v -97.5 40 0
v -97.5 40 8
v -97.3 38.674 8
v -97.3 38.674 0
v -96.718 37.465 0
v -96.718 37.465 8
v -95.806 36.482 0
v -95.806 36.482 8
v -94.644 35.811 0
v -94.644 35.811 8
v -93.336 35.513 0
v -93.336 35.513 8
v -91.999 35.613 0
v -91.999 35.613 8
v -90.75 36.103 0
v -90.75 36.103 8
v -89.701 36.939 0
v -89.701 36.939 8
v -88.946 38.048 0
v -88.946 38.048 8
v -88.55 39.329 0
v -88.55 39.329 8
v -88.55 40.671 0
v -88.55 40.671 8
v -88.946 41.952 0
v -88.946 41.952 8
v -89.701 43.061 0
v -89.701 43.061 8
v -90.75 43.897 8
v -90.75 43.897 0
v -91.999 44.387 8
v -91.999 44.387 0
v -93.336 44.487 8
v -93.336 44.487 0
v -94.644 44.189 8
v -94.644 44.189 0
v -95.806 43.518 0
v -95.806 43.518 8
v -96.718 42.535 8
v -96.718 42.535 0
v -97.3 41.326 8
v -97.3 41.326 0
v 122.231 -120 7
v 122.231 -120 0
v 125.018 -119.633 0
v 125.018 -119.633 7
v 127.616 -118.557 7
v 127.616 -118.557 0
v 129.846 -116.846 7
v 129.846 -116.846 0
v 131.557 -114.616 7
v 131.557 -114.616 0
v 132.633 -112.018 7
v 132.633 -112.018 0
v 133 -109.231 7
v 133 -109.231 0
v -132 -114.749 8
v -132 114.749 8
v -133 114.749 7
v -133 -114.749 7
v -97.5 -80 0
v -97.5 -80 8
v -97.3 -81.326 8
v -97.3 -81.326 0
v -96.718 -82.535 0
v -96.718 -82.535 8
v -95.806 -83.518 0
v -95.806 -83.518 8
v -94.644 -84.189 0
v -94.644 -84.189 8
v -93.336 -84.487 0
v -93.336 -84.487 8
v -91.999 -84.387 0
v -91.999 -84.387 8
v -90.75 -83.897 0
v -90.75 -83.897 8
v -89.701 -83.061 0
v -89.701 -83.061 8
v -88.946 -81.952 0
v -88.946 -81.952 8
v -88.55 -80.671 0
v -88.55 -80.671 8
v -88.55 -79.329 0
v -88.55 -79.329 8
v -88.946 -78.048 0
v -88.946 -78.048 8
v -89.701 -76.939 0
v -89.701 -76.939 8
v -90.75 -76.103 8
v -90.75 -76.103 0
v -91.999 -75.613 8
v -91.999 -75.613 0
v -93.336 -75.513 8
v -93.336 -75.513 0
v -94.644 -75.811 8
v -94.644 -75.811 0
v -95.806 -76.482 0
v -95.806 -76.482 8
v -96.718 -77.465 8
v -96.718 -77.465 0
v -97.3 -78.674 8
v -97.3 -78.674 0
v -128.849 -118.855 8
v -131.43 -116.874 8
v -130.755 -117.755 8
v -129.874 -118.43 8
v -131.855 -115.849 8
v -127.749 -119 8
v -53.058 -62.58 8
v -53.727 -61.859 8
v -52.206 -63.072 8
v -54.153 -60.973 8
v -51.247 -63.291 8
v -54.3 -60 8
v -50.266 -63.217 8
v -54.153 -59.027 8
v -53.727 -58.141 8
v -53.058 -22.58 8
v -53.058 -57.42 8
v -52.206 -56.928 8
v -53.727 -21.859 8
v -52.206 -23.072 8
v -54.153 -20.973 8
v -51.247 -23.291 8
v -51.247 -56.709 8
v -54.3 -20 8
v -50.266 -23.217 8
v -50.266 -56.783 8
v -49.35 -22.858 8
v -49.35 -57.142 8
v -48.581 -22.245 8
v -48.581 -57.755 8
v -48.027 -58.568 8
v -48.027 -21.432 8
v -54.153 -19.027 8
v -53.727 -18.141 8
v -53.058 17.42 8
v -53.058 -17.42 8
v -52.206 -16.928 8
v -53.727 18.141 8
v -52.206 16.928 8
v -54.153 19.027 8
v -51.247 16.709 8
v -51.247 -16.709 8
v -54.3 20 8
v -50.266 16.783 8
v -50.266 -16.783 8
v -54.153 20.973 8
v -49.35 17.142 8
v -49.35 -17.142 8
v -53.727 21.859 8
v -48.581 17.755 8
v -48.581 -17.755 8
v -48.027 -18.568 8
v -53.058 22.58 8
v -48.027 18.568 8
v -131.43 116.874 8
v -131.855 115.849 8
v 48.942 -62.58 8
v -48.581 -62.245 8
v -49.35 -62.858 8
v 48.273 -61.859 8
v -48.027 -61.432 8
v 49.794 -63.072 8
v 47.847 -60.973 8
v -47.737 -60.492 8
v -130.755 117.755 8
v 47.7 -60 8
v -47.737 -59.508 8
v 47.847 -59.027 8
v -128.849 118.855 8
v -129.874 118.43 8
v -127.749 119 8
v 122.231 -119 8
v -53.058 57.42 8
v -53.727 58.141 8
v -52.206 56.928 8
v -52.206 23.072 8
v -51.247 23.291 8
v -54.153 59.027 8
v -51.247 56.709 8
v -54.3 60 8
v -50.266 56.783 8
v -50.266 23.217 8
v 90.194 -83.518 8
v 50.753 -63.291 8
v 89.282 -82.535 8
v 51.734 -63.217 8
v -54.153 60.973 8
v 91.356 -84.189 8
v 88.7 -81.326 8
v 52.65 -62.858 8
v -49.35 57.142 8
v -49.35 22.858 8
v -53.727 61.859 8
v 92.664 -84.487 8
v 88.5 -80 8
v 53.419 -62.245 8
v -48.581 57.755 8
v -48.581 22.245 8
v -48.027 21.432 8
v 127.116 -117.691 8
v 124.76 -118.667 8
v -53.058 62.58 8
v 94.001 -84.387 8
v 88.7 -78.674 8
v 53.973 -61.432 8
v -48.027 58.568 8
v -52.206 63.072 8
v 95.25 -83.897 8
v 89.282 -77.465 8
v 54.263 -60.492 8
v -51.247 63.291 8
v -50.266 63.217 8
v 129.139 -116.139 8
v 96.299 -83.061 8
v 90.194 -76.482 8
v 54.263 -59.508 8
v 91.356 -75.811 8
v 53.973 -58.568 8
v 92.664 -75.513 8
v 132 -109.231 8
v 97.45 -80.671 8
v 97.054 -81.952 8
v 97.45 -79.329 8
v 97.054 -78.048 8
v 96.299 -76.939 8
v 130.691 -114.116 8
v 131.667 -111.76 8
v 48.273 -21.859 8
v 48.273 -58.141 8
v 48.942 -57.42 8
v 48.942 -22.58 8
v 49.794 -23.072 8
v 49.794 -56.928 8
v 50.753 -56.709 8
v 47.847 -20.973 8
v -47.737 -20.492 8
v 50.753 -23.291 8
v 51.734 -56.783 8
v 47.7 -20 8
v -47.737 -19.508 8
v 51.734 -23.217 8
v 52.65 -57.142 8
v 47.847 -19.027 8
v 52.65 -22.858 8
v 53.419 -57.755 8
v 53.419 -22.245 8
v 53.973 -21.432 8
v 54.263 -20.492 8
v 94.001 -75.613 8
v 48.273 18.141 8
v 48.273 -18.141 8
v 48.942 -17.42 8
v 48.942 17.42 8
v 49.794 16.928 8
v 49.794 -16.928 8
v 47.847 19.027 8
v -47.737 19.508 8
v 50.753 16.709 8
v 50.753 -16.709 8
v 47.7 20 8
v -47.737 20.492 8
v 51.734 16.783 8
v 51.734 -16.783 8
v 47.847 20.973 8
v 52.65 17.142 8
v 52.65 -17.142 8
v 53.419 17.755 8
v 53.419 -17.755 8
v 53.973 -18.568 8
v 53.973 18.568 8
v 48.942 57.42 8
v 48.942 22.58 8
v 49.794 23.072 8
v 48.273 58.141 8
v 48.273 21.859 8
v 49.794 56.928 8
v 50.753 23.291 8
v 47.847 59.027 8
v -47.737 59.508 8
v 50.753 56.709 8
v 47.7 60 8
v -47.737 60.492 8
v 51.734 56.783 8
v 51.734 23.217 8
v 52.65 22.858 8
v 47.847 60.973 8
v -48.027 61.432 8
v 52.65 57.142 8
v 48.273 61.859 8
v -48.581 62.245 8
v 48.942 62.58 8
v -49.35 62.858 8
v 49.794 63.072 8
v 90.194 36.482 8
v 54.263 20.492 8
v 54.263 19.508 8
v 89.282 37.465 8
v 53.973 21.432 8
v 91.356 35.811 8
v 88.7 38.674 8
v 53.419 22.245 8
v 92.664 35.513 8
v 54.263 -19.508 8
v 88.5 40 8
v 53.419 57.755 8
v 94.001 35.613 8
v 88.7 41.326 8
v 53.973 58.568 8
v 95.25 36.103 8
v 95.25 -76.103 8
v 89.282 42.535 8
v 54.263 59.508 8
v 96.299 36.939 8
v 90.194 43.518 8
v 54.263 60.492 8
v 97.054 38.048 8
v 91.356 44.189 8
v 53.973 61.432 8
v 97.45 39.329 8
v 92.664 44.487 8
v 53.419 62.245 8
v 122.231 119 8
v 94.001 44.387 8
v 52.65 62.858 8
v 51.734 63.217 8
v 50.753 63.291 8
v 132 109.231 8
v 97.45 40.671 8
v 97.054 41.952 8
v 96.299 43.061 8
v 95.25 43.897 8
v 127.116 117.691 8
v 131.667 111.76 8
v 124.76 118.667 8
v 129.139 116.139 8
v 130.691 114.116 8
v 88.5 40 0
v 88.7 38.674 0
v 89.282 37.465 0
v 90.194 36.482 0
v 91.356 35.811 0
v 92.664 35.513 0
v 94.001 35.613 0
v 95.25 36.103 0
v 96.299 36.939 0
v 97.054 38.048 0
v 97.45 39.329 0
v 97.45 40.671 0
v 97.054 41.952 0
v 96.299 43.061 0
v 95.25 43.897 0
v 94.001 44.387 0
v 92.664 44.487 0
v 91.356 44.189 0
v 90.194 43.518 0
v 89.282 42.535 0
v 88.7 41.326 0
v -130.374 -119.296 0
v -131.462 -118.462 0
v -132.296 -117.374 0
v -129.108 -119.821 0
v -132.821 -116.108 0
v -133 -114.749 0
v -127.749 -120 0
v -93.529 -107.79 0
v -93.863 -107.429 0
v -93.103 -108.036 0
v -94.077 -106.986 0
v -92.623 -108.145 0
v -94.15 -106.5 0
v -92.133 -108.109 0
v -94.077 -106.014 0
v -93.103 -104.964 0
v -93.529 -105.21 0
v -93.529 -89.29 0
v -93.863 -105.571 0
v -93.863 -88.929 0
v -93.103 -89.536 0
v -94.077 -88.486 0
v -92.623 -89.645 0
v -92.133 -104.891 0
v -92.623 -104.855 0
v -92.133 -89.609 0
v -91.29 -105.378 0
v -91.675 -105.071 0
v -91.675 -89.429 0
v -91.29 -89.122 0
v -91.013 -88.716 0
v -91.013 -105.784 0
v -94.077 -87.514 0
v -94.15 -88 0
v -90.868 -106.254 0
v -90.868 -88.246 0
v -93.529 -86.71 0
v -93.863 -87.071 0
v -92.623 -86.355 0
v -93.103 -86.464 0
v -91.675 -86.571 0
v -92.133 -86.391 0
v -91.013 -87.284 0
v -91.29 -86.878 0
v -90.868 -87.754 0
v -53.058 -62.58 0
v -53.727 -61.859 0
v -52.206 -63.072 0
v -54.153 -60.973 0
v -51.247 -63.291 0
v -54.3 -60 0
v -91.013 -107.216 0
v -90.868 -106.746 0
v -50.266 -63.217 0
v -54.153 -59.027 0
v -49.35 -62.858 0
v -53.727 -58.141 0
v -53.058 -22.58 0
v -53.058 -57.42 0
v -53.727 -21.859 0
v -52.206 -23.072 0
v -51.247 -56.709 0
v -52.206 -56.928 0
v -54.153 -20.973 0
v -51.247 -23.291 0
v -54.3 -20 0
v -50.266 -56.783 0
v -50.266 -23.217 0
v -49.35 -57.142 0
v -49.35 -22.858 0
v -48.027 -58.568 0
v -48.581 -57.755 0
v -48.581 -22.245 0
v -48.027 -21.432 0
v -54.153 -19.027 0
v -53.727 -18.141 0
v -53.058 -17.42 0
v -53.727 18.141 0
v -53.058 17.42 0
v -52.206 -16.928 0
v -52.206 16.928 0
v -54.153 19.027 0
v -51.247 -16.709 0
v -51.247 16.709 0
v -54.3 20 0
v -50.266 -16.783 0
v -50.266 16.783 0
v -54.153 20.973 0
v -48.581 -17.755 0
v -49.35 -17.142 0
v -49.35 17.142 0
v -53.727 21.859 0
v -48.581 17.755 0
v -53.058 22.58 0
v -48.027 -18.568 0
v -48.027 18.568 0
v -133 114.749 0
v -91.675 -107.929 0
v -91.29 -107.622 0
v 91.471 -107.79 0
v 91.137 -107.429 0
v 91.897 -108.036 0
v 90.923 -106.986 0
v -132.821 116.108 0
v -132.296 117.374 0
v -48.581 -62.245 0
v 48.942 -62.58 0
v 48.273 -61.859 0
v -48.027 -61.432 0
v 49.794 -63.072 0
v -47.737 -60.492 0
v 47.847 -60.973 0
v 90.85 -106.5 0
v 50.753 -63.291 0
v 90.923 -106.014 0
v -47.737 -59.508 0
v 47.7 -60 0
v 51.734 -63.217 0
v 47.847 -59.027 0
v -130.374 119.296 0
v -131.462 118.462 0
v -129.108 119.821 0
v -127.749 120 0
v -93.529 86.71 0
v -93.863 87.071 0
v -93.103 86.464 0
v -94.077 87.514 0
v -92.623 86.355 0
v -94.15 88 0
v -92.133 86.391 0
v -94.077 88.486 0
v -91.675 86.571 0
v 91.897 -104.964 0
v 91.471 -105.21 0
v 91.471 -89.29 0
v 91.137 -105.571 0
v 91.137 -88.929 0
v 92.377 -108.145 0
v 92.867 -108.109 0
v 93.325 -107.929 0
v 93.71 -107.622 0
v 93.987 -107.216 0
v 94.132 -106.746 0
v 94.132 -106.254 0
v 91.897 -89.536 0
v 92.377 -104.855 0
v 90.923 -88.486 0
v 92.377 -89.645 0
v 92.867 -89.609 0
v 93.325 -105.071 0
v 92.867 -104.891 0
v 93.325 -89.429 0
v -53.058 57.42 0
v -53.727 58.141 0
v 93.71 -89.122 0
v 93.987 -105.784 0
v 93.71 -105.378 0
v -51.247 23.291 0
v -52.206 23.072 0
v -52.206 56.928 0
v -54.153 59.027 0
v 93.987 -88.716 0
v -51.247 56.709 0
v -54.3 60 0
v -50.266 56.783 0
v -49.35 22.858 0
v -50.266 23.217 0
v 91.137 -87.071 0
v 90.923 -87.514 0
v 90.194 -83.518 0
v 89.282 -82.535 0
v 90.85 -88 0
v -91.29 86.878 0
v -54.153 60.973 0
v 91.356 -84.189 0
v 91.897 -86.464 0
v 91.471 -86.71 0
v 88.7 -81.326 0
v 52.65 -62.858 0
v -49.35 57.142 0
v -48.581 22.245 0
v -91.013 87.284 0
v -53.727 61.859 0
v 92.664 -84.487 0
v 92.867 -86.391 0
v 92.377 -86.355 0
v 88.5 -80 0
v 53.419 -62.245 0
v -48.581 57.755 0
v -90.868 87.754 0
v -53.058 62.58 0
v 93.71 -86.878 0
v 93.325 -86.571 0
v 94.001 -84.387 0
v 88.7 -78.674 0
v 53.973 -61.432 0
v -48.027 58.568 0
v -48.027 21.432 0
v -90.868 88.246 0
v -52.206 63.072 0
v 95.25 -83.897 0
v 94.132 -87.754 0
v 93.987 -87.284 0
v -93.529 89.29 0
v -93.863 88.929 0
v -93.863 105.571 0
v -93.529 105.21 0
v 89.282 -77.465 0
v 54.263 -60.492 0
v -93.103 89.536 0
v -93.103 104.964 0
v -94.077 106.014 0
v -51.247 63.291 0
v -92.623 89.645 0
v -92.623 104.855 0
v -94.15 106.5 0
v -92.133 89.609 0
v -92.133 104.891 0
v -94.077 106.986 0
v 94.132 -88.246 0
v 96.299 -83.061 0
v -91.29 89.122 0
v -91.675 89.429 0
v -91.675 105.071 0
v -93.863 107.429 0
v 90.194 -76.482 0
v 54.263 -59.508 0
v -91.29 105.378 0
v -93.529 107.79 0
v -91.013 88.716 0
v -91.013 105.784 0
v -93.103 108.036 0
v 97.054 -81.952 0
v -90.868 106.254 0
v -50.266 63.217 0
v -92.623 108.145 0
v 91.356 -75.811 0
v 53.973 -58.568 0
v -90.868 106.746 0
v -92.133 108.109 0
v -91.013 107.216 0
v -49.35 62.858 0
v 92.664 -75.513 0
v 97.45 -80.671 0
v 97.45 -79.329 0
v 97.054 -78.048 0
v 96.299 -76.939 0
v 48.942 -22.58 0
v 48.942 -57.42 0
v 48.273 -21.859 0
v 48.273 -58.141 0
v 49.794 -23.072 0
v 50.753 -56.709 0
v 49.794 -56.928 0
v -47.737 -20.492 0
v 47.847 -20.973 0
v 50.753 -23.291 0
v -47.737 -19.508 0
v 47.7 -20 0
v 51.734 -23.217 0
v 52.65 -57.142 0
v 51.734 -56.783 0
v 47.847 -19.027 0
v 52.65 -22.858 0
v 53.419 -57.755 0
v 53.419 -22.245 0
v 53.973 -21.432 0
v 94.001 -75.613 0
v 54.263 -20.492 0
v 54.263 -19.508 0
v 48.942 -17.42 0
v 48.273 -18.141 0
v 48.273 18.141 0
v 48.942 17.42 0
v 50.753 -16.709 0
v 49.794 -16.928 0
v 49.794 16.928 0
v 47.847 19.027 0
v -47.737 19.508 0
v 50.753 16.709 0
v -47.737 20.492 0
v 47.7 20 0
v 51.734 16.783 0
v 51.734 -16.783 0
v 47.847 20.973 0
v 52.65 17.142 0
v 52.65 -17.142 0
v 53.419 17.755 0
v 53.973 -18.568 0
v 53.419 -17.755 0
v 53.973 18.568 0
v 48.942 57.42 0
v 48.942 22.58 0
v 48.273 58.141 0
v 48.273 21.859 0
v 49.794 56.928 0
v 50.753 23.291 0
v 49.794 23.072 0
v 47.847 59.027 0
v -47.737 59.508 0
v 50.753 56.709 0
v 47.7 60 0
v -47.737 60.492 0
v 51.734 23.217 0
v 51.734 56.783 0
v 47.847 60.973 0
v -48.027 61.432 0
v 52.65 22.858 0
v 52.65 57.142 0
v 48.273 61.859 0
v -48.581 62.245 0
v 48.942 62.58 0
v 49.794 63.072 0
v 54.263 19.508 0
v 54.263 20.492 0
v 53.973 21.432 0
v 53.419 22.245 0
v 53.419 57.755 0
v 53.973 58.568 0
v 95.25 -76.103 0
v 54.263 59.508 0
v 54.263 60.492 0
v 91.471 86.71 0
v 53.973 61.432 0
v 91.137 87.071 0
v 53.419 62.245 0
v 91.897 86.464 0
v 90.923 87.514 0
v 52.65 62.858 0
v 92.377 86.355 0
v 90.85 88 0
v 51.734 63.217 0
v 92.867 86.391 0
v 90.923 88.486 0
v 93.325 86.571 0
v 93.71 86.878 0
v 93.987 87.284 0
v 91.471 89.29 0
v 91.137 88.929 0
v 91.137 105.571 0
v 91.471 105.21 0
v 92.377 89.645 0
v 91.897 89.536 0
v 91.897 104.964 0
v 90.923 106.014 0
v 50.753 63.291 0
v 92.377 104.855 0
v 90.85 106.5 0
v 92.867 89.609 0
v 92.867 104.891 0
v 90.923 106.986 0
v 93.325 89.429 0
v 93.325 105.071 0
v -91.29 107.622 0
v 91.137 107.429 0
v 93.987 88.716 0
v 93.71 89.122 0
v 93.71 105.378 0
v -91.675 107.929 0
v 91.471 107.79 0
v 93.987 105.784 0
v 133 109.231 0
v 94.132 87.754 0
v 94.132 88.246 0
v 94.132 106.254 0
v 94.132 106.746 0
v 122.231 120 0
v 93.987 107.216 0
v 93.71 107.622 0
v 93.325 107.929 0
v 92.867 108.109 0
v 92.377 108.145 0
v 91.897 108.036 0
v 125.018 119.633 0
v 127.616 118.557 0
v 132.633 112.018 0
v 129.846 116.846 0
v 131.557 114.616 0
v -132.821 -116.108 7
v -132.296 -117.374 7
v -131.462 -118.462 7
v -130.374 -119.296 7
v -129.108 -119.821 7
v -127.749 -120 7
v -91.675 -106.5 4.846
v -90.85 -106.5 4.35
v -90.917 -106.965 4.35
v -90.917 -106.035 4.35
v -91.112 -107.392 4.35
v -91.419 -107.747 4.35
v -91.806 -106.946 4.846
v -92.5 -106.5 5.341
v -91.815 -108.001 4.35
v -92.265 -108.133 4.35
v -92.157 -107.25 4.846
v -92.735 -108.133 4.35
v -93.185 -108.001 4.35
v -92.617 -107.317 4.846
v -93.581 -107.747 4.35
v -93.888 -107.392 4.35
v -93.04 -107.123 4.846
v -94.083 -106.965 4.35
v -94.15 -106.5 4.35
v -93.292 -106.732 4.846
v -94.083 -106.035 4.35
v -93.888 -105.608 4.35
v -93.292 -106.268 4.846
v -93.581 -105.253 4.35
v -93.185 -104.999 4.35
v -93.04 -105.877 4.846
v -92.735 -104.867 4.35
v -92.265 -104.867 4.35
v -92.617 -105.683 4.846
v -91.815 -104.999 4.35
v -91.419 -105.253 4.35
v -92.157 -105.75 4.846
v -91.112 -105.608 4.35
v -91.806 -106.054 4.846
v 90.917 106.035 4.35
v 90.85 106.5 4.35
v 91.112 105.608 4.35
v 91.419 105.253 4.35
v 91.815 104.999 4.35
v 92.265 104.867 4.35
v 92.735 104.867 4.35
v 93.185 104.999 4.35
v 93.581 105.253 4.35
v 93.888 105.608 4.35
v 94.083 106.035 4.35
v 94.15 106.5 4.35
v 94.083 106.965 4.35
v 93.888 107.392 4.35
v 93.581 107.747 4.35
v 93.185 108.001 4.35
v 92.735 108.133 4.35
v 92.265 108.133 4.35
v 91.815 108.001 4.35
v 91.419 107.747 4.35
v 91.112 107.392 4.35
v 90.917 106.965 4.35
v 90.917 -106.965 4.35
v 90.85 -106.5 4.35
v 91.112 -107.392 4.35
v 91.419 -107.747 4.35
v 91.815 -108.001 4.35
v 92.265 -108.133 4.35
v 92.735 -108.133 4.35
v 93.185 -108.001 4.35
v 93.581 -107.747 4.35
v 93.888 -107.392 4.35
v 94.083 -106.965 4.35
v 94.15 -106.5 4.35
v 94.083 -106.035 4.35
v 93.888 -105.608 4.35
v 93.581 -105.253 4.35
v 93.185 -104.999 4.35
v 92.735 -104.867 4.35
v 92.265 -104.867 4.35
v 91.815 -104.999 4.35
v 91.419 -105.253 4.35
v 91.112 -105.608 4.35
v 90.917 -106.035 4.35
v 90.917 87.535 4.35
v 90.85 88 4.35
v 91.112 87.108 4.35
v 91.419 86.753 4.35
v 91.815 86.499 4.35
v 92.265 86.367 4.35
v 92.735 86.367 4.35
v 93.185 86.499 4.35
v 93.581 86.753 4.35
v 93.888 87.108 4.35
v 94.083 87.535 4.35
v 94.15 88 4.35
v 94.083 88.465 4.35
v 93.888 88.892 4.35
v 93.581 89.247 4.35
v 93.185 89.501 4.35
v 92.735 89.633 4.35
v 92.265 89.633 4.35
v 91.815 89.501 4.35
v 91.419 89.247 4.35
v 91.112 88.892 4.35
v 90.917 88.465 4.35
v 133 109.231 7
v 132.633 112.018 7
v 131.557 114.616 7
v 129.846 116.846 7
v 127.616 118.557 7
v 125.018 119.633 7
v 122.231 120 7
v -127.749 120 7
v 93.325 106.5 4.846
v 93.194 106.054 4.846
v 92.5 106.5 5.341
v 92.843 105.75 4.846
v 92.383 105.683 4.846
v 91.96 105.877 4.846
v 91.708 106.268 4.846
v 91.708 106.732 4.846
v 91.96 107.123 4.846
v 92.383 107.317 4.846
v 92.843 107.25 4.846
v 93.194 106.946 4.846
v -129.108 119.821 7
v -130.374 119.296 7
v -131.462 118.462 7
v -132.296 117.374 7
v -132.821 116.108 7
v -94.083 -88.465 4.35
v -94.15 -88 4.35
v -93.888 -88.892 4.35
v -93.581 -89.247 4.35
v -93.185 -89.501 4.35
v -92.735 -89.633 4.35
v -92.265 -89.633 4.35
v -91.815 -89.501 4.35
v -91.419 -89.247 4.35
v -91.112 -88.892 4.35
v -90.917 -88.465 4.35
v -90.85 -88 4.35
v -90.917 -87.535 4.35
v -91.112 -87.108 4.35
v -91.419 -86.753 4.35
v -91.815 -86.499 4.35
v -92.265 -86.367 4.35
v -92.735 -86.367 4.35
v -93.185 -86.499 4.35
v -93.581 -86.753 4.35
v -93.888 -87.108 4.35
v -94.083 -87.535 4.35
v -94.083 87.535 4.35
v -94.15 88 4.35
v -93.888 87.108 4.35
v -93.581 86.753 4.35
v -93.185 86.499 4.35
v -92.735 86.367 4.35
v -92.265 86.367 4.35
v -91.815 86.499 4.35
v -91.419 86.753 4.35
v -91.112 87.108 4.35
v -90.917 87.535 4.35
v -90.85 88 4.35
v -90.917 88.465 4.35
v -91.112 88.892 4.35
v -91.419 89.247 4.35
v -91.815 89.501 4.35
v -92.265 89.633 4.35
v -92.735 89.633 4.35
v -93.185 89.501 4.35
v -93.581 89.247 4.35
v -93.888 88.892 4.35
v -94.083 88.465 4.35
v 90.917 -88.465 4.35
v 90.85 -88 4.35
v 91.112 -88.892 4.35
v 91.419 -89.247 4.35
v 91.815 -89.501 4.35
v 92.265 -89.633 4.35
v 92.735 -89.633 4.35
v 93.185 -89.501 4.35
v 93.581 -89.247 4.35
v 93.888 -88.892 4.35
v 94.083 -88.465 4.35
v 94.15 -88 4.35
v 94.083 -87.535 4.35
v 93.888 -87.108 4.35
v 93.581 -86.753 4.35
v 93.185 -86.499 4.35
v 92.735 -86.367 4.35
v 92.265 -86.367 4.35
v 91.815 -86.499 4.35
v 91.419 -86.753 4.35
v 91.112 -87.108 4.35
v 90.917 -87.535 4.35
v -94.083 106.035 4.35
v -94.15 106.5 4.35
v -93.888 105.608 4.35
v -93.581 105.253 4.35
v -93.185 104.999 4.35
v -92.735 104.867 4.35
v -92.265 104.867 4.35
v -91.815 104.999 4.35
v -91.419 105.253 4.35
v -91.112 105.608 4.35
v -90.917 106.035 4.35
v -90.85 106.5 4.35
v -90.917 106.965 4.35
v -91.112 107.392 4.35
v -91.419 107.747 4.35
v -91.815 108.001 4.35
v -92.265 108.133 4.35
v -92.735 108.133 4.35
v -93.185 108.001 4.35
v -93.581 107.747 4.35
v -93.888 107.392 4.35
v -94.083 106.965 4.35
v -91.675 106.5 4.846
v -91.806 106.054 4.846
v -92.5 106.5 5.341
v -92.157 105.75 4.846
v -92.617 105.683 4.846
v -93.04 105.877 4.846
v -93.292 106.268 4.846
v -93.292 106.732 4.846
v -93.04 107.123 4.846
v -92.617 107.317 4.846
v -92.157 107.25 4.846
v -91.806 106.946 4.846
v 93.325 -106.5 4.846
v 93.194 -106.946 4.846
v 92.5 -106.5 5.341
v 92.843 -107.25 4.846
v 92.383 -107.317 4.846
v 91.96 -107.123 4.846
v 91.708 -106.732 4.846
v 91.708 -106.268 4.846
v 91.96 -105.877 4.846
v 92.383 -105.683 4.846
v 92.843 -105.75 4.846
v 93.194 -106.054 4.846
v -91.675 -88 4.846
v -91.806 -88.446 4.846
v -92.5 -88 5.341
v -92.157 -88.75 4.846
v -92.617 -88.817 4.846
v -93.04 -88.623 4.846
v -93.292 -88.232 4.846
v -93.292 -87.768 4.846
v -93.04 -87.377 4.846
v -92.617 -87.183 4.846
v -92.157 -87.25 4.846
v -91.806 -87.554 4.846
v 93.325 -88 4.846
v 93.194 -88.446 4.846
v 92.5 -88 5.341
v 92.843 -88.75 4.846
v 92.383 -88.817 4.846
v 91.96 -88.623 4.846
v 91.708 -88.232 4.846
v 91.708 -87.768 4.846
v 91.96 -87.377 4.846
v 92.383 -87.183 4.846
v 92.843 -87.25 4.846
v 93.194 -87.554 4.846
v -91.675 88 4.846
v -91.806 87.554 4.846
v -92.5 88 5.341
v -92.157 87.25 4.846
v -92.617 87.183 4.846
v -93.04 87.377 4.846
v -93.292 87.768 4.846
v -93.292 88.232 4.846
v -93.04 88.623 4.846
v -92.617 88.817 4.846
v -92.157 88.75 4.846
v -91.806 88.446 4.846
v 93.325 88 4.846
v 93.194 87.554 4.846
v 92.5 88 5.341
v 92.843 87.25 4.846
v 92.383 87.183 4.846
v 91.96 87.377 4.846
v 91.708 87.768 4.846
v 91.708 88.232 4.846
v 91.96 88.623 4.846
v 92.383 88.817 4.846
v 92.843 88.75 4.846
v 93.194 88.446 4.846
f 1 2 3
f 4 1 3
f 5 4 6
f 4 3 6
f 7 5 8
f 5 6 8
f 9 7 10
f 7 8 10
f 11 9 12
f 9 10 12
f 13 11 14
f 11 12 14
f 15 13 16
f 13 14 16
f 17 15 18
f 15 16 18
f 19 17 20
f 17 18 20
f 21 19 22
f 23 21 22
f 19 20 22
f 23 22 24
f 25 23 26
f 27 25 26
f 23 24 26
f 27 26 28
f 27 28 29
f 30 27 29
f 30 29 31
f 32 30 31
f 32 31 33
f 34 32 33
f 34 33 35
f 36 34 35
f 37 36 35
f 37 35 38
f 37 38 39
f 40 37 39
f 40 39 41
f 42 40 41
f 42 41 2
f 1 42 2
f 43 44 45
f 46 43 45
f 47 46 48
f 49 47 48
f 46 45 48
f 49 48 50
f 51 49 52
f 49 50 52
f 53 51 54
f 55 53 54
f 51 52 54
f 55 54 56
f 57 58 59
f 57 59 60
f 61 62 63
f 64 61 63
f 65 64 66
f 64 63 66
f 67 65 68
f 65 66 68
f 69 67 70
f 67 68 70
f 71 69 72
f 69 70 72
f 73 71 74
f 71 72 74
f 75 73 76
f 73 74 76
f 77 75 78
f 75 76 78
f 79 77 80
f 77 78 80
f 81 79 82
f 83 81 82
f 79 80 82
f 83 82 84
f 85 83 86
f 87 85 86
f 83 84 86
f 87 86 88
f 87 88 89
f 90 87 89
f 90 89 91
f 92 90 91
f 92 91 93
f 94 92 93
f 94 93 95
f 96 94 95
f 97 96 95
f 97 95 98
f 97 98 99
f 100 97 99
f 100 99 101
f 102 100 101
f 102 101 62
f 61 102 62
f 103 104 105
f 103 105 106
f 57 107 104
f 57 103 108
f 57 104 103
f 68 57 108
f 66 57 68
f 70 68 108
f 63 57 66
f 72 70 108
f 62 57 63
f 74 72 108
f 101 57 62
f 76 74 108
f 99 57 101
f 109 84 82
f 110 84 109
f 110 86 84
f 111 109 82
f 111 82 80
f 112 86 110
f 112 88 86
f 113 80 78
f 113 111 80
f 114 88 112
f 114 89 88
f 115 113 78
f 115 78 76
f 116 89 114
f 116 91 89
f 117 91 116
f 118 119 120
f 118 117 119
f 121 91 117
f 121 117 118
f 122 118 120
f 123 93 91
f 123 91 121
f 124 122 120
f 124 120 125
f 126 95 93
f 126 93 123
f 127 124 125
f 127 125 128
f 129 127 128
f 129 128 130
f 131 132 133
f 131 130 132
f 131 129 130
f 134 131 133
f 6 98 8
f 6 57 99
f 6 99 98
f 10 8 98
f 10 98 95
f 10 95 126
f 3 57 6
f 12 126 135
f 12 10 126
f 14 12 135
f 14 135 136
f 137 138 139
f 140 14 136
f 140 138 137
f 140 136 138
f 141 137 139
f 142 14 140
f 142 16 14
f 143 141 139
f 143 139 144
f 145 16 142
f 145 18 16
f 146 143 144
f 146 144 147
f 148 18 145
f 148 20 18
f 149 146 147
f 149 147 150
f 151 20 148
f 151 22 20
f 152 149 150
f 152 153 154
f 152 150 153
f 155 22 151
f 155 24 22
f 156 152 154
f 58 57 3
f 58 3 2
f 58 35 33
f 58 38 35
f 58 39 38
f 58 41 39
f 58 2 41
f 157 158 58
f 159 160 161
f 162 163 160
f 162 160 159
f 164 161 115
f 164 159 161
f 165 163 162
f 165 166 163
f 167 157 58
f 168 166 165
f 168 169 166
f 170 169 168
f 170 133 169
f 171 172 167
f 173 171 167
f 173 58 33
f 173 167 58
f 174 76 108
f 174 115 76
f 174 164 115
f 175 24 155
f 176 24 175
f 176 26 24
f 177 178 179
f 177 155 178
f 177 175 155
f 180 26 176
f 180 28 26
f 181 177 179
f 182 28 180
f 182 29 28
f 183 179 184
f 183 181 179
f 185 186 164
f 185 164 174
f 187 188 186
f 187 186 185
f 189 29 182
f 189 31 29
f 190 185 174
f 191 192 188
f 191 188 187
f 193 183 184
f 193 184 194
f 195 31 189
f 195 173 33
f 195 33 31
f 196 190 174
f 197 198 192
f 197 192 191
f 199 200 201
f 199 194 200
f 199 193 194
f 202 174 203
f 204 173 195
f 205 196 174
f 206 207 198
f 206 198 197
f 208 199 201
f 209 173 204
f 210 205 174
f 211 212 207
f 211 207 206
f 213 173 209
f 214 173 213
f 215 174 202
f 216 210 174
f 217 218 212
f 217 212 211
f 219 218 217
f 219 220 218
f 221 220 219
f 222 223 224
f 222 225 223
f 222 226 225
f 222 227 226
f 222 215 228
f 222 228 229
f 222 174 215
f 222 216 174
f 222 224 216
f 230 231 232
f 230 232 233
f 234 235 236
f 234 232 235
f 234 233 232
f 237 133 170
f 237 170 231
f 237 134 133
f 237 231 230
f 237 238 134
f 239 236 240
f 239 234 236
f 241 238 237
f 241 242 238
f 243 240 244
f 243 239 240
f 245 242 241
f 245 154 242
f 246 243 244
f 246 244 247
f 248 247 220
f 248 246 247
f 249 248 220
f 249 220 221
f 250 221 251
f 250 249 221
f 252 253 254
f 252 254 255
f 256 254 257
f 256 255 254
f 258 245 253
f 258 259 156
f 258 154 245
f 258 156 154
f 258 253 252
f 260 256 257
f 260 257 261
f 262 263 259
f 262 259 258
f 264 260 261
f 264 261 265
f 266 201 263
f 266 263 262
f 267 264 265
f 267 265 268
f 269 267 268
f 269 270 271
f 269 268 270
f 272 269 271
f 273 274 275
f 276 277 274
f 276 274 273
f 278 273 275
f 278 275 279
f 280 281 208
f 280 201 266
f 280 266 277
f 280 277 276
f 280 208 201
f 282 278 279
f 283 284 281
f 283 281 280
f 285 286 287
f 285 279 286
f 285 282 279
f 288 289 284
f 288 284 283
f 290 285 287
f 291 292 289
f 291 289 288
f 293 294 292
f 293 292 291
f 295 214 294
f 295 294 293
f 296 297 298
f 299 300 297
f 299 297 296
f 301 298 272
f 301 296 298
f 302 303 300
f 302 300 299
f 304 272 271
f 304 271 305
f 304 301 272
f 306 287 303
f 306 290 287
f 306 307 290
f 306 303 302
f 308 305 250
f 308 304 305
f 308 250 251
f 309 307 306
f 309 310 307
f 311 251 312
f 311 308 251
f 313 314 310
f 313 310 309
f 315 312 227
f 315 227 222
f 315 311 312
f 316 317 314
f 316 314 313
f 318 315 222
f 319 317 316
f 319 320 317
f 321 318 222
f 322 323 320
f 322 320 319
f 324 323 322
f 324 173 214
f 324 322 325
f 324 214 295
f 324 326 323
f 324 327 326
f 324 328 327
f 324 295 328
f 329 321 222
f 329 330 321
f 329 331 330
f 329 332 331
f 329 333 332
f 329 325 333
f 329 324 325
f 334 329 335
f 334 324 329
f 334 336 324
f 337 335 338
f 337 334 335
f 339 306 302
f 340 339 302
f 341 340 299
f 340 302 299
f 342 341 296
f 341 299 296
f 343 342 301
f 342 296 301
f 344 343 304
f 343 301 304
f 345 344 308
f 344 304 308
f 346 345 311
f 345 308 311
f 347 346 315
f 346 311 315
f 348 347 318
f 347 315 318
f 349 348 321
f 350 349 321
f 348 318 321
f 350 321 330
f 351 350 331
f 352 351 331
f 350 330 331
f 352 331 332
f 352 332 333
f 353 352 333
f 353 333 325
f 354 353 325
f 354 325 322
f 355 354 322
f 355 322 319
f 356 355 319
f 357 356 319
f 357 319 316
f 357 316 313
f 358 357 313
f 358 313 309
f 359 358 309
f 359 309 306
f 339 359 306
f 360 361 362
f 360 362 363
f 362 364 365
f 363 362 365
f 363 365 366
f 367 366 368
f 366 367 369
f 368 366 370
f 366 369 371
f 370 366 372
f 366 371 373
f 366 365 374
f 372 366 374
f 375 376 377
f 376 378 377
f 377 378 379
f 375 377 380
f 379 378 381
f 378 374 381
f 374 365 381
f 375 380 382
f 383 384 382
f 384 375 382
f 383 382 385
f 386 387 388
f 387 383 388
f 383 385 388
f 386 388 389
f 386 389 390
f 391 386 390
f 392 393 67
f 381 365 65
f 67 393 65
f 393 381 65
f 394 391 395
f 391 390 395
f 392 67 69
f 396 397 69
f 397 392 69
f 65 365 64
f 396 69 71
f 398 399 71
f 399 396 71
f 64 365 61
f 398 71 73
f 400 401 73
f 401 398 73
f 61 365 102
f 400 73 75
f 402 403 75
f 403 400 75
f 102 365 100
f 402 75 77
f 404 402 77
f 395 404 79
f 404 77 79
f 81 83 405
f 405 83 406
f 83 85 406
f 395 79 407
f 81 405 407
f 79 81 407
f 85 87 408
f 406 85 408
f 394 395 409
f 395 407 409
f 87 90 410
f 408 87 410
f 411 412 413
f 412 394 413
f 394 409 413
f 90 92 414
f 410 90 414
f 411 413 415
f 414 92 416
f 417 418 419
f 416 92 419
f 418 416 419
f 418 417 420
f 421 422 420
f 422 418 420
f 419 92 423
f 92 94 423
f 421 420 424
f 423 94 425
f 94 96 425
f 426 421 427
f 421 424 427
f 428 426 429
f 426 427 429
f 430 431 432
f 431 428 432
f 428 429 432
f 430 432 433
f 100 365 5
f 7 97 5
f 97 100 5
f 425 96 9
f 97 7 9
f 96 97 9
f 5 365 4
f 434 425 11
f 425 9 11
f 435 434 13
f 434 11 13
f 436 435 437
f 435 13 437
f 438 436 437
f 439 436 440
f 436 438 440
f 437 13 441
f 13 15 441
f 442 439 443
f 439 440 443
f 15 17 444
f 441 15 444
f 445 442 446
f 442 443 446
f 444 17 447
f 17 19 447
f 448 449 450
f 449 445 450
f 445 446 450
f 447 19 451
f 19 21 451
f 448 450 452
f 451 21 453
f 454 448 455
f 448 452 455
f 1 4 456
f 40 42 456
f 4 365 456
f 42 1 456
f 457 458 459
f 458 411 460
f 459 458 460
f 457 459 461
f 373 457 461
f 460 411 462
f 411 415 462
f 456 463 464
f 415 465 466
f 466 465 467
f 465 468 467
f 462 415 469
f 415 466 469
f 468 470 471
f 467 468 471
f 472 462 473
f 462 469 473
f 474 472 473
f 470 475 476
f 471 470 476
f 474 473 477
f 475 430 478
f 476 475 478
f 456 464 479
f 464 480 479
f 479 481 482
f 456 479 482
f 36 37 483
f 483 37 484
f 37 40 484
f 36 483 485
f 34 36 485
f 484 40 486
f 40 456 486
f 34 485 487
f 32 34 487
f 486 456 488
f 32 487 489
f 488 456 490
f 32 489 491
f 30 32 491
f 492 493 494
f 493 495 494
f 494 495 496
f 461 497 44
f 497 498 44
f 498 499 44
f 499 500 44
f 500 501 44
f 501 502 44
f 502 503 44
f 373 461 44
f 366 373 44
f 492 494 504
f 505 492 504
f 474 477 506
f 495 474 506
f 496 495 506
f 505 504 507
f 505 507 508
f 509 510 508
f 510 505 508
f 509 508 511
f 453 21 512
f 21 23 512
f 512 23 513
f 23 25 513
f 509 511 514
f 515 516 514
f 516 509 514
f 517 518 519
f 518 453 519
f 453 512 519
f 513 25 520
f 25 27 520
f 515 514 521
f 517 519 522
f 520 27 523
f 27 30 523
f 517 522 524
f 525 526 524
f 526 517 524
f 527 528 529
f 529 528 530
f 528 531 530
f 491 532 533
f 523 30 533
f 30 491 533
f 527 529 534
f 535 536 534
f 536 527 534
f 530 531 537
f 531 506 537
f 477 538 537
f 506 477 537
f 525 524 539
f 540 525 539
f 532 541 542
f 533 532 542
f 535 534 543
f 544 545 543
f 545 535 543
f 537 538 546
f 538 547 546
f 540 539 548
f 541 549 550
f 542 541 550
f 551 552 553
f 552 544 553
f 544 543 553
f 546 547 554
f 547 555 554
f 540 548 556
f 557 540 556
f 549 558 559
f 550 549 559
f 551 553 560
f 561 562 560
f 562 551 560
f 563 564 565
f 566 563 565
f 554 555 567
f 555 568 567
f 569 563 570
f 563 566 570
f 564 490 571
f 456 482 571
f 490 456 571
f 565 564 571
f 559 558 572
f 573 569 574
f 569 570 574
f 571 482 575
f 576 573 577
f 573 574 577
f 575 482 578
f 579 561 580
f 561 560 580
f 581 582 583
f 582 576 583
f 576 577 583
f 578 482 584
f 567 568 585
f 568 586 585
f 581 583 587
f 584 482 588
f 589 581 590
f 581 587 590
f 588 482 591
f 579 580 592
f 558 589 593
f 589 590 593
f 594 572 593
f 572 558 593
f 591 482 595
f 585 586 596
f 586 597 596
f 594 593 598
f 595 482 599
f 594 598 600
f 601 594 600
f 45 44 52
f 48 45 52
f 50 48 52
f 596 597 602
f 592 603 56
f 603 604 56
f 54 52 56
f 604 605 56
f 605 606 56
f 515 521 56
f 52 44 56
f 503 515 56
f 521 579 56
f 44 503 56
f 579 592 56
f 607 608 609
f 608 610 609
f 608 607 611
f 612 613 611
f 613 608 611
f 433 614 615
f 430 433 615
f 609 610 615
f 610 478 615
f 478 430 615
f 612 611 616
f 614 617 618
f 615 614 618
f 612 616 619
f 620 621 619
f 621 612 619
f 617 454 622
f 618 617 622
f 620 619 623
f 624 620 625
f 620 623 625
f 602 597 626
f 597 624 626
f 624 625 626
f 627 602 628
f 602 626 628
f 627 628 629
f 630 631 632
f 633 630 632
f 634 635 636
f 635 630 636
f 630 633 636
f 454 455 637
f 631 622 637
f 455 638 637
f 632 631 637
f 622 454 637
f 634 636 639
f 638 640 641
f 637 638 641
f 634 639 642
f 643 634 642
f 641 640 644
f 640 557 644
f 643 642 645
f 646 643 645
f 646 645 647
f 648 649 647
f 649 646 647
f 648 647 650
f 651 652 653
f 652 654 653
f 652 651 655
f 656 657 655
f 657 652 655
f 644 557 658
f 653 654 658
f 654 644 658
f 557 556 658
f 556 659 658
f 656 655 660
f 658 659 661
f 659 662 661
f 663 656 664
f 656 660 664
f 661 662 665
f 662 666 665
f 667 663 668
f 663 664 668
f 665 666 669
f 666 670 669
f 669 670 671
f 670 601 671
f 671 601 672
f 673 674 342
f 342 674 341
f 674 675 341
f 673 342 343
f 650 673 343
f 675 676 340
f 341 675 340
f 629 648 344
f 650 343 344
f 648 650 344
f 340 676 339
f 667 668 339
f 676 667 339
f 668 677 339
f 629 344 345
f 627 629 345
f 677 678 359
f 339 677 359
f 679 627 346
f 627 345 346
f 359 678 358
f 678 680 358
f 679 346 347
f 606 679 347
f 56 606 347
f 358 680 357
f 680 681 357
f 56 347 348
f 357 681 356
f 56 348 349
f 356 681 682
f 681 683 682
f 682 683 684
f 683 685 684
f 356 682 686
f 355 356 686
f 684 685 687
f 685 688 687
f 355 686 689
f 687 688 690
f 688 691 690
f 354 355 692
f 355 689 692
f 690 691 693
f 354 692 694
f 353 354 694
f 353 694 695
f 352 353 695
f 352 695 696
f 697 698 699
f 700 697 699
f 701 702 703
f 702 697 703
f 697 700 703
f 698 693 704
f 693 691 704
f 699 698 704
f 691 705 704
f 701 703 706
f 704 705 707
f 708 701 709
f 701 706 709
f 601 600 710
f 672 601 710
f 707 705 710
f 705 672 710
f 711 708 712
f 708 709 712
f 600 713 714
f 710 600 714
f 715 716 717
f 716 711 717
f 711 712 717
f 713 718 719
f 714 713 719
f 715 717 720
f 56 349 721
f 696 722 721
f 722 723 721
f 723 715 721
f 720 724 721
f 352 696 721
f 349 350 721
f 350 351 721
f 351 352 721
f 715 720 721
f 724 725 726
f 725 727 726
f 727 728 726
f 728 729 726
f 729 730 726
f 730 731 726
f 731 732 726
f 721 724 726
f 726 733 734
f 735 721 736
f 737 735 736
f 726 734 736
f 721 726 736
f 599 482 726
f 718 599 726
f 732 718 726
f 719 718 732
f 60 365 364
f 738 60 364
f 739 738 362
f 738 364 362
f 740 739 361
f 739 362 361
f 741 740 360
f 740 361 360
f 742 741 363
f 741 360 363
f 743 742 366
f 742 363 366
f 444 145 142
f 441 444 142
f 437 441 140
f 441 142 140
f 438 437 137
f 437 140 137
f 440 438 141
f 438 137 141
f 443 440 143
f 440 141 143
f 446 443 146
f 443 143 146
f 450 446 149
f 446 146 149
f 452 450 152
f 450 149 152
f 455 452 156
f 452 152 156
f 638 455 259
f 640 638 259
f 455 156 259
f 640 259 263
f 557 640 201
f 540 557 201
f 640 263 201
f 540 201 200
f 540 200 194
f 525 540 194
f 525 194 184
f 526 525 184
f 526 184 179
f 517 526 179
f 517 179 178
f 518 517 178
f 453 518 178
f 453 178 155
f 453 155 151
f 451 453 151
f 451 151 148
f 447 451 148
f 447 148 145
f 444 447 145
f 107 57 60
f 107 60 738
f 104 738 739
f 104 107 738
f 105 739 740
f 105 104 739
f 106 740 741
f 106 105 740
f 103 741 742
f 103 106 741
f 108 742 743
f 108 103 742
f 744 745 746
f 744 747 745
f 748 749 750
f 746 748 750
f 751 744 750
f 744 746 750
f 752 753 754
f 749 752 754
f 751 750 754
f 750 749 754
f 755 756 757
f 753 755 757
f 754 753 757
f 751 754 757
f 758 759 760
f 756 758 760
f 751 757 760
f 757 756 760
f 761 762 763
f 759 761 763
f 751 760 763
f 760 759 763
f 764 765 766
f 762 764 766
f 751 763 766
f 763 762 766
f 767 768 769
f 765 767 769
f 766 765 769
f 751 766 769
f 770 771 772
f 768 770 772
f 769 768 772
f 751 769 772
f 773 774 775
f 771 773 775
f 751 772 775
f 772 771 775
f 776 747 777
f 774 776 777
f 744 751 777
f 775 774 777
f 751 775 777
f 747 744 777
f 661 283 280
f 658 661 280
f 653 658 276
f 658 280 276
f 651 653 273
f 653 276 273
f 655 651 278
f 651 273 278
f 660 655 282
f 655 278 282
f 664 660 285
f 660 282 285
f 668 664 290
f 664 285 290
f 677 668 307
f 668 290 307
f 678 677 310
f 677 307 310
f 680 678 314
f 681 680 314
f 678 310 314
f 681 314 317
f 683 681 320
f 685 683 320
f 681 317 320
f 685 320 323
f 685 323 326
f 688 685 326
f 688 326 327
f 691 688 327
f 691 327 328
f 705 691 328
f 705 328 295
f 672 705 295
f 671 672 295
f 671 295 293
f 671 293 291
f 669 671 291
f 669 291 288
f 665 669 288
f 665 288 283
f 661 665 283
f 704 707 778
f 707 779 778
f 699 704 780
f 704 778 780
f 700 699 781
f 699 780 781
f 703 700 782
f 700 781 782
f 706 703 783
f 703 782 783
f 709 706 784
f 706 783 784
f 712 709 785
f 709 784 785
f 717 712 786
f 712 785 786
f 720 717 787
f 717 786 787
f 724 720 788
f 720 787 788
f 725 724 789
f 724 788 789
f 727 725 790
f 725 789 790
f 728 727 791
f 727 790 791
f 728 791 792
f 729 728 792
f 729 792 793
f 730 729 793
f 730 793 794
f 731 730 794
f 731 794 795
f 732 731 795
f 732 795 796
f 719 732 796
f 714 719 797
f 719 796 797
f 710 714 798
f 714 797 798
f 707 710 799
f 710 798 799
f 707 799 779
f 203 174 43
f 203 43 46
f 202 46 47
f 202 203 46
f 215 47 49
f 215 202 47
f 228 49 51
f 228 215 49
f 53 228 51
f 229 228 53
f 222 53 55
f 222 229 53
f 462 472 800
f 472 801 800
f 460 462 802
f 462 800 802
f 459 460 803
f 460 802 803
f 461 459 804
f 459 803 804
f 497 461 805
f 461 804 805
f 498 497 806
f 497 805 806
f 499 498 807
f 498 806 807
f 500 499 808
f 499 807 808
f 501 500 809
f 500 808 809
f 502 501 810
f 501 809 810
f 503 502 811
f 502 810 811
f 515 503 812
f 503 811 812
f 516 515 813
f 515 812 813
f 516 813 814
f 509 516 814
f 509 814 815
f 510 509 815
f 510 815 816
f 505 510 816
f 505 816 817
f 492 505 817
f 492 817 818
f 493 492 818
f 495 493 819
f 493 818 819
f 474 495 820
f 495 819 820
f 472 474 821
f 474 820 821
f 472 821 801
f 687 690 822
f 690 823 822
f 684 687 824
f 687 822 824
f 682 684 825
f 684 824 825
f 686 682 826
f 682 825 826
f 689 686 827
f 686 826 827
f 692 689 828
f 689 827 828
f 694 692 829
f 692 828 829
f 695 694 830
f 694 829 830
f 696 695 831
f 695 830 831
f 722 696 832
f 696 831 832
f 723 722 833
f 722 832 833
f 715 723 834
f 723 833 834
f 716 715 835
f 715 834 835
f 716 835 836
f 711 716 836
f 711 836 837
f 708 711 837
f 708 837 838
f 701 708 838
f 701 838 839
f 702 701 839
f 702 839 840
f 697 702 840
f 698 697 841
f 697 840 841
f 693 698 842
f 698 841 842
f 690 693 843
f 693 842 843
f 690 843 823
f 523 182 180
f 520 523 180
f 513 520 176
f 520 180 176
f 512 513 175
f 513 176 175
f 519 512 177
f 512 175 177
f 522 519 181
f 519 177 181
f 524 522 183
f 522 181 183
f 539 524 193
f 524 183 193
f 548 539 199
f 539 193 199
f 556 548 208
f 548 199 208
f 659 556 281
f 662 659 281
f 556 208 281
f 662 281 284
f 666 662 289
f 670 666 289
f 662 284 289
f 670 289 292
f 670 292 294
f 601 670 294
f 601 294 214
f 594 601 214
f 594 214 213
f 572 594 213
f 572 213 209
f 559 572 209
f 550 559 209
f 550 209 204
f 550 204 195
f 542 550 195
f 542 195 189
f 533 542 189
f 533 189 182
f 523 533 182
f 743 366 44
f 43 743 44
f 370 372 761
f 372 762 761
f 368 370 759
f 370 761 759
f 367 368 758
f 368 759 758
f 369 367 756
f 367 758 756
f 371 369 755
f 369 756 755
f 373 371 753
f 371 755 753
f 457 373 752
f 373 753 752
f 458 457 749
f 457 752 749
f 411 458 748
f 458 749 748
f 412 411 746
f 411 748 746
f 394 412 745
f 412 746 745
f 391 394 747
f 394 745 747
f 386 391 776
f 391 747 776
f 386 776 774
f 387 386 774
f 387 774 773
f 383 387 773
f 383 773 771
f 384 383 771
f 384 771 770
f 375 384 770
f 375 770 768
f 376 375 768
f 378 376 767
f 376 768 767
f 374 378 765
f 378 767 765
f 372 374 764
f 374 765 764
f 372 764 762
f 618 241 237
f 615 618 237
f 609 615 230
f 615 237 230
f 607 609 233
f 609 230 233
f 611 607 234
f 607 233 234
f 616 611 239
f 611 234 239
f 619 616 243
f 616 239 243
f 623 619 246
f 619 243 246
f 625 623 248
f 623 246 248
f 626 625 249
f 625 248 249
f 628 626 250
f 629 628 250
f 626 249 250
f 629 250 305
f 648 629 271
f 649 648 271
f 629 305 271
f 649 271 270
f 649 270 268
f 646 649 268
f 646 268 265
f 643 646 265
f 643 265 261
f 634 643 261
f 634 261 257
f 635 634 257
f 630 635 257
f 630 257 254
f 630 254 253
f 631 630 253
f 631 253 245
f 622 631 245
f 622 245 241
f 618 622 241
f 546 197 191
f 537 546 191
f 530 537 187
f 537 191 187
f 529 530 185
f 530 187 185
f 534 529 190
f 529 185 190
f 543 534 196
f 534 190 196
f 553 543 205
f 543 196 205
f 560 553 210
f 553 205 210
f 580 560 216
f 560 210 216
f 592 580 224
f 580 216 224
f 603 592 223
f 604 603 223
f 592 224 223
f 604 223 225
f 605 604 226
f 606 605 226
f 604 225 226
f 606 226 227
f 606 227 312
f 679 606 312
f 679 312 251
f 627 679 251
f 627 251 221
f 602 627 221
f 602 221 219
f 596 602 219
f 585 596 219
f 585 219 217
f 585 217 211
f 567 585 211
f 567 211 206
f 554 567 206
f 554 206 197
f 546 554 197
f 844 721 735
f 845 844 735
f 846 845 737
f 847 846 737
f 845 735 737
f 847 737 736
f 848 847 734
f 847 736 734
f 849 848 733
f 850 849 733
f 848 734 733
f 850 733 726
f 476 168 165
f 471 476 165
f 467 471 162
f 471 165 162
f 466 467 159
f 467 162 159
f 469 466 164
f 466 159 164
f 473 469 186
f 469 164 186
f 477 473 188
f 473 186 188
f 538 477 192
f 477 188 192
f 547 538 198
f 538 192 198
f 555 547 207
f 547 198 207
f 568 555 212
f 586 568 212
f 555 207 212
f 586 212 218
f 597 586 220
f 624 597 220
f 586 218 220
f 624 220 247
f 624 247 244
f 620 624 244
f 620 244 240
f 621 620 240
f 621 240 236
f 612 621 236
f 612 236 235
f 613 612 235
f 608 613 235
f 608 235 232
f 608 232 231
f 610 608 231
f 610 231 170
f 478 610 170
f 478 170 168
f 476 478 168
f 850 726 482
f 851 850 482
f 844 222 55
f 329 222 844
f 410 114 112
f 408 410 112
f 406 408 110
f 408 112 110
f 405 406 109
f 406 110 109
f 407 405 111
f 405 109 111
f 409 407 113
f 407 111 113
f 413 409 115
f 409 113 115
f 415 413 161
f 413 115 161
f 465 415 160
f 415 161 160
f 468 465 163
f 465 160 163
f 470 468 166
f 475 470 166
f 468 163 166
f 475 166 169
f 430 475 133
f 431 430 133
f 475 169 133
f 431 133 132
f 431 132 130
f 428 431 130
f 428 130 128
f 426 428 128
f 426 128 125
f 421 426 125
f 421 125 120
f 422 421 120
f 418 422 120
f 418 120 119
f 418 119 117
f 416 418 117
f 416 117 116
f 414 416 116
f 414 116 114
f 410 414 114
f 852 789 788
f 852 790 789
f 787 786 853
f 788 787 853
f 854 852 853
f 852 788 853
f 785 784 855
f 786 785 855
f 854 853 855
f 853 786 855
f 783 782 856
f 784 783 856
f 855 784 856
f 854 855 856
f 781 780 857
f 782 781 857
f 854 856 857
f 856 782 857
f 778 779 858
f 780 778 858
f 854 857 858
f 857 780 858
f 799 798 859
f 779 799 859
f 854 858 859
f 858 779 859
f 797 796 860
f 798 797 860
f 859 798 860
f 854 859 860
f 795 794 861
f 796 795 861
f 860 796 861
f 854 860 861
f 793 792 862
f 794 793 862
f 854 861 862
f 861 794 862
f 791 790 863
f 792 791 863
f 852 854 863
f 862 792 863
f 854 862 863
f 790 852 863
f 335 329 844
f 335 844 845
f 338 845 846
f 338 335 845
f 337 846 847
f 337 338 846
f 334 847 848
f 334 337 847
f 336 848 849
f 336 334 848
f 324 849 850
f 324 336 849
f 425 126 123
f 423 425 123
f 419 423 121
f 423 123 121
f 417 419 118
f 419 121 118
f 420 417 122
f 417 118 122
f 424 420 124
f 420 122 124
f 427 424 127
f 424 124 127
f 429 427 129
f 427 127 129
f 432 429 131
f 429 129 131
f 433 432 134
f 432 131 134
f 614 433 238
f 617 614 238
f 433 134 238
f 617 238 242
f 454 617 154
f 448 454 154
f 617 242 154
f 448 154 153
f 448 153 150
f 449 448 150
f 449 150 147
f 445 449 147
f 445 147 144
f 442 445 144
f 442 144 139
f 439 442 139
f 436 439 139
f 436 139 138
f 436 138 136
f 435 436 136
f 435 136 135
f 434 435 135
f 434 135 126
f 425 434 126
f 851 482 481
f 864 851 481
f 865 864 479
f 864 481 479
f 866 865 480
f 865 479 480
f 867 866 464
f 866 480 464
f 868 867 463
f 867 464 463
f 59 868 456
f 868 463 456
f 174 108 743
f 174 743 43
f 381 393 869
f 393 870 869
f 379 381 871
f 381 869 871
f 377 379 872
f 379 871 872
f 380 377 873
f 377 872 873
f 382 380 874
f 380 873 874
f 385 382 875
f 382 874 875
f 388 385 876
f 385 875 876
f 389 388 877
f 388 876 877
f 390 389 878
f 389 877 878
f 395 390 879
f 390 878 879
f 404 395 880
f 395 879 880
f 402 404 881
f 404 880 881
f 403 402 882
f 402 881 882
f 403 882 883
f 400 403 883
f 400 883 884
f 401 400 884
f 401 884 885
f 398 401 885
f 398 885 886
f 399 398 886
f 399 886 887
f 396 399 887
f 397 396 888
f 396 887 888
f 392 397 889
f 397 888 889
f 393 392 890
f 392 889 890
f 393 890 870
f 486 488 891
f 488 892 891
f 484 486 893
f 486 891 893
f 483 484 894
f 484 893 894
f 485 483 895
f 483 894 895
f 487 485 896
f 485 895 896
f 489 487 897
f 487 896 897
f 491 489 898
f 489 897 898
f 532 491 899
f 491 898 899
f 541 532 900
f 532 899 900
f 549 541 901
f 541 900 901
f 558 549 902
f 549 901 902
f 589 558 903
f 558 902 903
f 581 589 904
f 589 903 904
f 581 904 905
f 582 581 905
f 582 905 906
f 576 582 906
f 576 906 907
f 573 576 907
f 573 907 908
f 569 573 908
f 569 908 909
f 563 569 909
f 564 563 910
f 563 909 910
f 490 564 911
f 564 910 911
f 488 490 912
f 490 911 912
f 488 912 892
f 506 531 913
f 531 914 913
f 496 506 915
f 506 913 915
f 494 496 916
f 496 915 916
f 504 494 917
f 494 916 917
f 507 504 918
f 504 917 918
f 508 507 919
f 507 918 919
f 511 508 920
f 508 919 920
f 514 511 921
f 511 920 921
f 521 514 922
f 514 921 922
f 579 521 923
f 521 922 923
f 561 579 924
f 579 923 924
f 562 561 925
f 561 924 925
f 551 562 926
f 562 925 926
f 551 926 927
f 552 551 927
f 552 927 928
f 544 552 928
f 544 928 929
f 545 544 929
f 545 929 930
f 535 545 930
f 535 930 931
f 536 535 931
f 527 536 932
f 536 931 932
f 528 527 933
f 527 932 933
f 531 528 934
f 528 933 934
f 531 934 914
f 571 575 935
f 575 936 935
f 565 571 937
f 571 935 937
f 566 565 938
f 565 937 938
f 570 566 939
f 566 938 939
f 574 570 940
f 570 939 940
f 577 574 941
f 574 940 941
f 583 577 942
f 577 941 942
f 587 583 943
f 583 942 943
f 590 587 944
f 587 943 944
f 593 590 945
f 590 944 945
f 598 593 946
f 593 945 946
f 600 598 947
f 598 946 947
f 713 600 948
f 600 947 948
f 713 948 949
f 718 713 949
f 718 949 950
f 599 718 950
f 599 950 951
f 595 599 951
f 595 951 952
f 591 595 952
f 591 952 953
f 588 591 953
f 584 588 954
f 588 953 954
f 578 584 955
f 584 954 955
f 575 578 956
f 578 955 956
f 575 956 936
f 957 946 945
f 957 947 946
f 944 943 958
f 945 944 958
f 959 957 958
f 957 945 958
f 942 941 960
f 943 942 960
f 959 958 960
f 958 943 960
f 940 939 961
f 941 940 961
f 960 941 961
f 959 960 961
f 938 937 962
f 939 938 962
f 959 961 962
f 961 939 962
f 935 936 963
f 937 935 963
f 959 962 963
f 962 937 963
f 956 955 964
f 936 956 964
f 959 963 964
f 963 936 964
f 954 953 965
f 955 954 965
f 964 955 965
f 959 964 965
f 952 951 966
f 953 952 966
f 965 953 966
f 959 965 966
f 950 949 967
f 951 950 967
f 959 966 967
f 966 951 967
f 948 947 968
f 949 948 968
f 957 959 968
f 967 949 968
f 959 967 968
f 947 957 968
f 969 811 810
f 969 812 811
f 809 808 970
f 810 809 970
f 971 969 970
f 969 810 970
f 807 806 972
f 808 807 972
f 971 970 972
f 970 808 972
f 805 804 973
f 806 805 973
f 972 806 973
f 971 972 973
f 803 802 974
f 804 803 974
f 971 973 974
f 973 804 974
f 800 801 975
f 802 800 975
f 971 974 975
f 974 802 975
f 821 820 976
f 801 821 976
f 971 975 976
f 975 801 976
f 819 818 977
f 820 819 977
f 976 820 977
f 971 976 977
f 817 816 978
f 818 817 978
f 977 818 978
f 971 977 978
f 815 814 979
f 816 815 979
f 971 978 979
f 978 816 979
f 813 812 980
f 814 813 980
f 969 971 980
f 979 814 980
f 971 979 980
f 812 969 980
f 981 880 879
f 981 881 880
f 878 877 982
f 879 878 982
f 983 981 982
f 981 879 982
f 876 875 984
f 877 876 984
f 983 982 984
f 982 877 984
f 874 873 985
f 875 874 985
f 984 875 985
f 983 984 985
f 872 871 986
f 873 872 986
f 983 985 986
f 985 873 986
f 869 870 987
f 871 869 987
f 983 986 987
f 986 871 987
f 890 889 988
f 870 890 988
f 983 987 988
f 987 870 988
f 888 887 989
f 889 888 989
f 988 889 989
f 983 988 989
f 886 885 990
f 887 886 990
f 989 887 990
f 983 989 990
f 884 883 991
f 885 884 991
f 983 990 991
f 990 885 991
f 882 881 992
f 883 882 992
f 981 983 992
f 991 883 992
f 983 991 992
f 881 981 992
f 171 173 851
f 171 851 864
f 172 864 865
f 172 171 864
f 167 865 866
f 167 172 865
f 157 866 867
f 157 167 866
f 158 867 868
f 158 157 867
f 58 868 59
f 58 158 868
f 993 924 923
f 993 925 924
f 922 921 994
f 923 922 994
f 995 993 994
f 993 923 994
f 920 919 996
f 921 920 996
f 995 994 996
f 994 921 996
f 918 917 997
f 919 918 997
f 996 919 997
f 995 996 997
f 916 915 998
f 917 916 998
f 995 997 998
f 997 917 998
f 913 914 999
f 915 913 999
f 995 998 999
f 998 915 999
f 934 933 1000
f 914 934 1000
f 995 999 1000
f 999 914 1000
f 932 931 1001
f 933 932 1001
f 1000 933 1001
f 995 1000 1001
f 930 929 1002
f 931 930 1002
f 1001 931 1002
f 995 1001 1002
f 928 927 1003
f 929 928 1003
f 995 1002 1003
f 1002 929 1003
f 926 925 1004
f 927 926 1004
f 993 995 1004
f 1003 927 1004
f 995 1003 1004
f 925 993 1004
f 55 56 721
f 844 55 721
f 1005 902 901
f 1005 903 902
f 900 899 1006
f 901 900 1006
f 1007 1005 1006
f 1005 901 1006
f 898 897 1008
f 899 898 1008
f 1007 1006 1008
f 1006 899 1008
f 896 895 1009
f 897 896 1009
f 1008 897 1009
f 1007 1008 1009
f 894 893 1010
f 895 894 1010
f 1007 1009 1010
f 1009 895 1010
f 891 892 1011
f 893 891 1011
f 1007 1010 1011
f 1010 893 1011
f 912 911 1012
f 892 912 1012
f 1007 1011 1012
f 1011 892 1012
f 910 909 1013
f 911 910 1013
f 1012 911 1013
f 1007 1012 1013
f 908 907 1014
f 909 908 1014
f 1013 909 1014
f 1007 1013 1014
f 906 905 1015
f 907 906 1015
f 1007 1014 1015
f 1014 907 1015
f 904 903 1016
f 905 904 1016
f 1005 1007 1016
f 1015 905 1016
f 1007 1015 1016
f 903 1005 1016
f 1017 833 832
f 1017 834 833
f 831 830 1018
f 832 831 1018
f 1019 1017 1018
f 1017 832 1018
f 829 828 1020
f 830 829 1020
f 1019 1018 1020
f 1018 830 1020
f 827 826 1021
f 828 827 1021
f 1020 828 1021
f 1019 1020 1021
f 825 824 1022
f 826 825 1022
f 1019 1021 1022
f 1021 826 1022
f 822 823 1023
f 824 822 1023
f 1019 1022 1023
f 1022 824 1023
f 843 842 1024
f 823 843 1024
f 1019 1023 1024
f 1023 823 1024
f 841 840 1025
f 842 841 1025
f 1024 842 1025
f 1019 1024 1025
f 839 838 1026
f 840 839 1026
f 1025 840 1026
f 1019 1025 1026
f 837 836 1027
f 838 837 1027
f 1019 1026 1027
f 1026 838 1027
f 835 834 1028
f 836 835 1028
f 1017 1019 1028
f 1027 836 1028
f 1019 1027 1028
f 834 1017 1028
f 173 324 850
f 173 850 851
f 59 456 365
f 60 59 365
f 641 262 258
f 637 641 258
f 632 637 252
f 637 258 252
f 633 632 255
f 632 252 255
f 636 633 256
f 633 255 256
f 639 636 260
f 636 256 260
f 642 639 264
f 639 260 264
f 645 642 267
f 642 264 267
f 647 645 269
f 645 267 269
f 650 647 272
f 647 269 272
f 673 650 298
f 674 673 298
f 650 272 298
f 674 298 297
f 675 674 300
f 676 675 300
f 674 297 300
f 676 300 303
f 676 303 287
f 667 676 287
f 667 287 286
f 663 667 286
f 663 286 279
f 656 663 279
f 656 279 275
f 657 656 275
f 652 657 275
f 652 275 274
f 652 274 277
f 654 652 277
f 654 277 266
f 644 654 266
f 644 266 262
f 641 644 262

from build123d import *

# Parameters (mm, degrees)
F1_DEPTH = 8
F2_SIZE  = 1
F3_D     = 6.6
F4_D     = 9
F5_D     = 3.3
F5_DEPTH = 4.35
F5_TIP   = 0.9914200214


with BuildPart() as f1:
    # F0 (on Top) → F1 (new body)
    with BuildSketch(Plane.XY):
        with BuildLine():
            Line((-127.7485371086, -120), (122.231243908, -120))
            ThreePointArc((122.231243908, -120), (129.8459043656, -116.8459043656), (133, -109.231243908))
            Line((133, -109.231243908), (133, 109.231243908))
            ThreePointArc((133, 109.231243908), (129.8459043656, 116.8459043656), (122.231243908, 120))
            Line((122.231243908, 120), (-127.7485371086, 120))
            ThreePointArc((-127.7485371086, 120), (-131.4618821303, 118.4618821303), (-133, 114.7485371086))
            Line((-133, 114.7485371086), (-133, -114.7485371086))
            ThreePointArc((-133, -114.7485371086), (-131.4618821303, -118.4618821303), (-127.7485371086, -120))
        make_face()
    extrude(amount=F1_DEPTH)

    # F2
    f2_edges = [f1.edges().sort_by_distance(p)[0] for p in [
        (-2.758647, -120, 8),
        (129.845904, -116.845904, 8),
        (133, 0, 8),
        (129.845904, 116.845904, 8),
        (-2.758647, 120, 8),
        (-131.461882, 118.461882, 8),
        (-133, 0, 8),
        (-131.461882, -118.461882, 8),
    ]]
    chamfer(f2_edges, length=F2_SIZE)

    # F3 (through all)
    with Locations(Plane(origin=(0, 0, 0), x_dir=(1, 0, 0), z_dir=(0, 0, -1))):
        with Locations((-51, 60), (-51, 20), (-51, -20), (-51, -60), (51, -60), (51, -20), (51, 20), (51, 60)):
            Hole(F3_D / 2)

    # F4 (through all)
    with Locations(Plane(origin=(0, 0, 0), x_dir=(1, 0, 0), z_dir=(0, 0, -1))):
        with Locations((-93, 80), (-93, -40), (93, -40), (93, 80)):
            Hole(F4_D / 2)

    # F5
    with Locations(Plane(origin=(0, 0, 0), x_dir=(1, 0, 0), z_dir=(0, 0, -1))):
        with Locations((-92.5, 88), (-92.5, 106.5), (92.5, 88), (92.5, 106.5), (92.5, -88), (92.5, -106.5), (-92.5, -88), (-92.5, -106.5)):
            Hole(F5_D / 2, depth=F5_DEPTH)
            with Locations((0, 0, -(F5_DEPTH + F5_TIP / 2))):  # 118° drill point
                Cone(0, F5_D / 2, F5_TIP, mode=Mode.SUBTRACT)


solid = f1.part
